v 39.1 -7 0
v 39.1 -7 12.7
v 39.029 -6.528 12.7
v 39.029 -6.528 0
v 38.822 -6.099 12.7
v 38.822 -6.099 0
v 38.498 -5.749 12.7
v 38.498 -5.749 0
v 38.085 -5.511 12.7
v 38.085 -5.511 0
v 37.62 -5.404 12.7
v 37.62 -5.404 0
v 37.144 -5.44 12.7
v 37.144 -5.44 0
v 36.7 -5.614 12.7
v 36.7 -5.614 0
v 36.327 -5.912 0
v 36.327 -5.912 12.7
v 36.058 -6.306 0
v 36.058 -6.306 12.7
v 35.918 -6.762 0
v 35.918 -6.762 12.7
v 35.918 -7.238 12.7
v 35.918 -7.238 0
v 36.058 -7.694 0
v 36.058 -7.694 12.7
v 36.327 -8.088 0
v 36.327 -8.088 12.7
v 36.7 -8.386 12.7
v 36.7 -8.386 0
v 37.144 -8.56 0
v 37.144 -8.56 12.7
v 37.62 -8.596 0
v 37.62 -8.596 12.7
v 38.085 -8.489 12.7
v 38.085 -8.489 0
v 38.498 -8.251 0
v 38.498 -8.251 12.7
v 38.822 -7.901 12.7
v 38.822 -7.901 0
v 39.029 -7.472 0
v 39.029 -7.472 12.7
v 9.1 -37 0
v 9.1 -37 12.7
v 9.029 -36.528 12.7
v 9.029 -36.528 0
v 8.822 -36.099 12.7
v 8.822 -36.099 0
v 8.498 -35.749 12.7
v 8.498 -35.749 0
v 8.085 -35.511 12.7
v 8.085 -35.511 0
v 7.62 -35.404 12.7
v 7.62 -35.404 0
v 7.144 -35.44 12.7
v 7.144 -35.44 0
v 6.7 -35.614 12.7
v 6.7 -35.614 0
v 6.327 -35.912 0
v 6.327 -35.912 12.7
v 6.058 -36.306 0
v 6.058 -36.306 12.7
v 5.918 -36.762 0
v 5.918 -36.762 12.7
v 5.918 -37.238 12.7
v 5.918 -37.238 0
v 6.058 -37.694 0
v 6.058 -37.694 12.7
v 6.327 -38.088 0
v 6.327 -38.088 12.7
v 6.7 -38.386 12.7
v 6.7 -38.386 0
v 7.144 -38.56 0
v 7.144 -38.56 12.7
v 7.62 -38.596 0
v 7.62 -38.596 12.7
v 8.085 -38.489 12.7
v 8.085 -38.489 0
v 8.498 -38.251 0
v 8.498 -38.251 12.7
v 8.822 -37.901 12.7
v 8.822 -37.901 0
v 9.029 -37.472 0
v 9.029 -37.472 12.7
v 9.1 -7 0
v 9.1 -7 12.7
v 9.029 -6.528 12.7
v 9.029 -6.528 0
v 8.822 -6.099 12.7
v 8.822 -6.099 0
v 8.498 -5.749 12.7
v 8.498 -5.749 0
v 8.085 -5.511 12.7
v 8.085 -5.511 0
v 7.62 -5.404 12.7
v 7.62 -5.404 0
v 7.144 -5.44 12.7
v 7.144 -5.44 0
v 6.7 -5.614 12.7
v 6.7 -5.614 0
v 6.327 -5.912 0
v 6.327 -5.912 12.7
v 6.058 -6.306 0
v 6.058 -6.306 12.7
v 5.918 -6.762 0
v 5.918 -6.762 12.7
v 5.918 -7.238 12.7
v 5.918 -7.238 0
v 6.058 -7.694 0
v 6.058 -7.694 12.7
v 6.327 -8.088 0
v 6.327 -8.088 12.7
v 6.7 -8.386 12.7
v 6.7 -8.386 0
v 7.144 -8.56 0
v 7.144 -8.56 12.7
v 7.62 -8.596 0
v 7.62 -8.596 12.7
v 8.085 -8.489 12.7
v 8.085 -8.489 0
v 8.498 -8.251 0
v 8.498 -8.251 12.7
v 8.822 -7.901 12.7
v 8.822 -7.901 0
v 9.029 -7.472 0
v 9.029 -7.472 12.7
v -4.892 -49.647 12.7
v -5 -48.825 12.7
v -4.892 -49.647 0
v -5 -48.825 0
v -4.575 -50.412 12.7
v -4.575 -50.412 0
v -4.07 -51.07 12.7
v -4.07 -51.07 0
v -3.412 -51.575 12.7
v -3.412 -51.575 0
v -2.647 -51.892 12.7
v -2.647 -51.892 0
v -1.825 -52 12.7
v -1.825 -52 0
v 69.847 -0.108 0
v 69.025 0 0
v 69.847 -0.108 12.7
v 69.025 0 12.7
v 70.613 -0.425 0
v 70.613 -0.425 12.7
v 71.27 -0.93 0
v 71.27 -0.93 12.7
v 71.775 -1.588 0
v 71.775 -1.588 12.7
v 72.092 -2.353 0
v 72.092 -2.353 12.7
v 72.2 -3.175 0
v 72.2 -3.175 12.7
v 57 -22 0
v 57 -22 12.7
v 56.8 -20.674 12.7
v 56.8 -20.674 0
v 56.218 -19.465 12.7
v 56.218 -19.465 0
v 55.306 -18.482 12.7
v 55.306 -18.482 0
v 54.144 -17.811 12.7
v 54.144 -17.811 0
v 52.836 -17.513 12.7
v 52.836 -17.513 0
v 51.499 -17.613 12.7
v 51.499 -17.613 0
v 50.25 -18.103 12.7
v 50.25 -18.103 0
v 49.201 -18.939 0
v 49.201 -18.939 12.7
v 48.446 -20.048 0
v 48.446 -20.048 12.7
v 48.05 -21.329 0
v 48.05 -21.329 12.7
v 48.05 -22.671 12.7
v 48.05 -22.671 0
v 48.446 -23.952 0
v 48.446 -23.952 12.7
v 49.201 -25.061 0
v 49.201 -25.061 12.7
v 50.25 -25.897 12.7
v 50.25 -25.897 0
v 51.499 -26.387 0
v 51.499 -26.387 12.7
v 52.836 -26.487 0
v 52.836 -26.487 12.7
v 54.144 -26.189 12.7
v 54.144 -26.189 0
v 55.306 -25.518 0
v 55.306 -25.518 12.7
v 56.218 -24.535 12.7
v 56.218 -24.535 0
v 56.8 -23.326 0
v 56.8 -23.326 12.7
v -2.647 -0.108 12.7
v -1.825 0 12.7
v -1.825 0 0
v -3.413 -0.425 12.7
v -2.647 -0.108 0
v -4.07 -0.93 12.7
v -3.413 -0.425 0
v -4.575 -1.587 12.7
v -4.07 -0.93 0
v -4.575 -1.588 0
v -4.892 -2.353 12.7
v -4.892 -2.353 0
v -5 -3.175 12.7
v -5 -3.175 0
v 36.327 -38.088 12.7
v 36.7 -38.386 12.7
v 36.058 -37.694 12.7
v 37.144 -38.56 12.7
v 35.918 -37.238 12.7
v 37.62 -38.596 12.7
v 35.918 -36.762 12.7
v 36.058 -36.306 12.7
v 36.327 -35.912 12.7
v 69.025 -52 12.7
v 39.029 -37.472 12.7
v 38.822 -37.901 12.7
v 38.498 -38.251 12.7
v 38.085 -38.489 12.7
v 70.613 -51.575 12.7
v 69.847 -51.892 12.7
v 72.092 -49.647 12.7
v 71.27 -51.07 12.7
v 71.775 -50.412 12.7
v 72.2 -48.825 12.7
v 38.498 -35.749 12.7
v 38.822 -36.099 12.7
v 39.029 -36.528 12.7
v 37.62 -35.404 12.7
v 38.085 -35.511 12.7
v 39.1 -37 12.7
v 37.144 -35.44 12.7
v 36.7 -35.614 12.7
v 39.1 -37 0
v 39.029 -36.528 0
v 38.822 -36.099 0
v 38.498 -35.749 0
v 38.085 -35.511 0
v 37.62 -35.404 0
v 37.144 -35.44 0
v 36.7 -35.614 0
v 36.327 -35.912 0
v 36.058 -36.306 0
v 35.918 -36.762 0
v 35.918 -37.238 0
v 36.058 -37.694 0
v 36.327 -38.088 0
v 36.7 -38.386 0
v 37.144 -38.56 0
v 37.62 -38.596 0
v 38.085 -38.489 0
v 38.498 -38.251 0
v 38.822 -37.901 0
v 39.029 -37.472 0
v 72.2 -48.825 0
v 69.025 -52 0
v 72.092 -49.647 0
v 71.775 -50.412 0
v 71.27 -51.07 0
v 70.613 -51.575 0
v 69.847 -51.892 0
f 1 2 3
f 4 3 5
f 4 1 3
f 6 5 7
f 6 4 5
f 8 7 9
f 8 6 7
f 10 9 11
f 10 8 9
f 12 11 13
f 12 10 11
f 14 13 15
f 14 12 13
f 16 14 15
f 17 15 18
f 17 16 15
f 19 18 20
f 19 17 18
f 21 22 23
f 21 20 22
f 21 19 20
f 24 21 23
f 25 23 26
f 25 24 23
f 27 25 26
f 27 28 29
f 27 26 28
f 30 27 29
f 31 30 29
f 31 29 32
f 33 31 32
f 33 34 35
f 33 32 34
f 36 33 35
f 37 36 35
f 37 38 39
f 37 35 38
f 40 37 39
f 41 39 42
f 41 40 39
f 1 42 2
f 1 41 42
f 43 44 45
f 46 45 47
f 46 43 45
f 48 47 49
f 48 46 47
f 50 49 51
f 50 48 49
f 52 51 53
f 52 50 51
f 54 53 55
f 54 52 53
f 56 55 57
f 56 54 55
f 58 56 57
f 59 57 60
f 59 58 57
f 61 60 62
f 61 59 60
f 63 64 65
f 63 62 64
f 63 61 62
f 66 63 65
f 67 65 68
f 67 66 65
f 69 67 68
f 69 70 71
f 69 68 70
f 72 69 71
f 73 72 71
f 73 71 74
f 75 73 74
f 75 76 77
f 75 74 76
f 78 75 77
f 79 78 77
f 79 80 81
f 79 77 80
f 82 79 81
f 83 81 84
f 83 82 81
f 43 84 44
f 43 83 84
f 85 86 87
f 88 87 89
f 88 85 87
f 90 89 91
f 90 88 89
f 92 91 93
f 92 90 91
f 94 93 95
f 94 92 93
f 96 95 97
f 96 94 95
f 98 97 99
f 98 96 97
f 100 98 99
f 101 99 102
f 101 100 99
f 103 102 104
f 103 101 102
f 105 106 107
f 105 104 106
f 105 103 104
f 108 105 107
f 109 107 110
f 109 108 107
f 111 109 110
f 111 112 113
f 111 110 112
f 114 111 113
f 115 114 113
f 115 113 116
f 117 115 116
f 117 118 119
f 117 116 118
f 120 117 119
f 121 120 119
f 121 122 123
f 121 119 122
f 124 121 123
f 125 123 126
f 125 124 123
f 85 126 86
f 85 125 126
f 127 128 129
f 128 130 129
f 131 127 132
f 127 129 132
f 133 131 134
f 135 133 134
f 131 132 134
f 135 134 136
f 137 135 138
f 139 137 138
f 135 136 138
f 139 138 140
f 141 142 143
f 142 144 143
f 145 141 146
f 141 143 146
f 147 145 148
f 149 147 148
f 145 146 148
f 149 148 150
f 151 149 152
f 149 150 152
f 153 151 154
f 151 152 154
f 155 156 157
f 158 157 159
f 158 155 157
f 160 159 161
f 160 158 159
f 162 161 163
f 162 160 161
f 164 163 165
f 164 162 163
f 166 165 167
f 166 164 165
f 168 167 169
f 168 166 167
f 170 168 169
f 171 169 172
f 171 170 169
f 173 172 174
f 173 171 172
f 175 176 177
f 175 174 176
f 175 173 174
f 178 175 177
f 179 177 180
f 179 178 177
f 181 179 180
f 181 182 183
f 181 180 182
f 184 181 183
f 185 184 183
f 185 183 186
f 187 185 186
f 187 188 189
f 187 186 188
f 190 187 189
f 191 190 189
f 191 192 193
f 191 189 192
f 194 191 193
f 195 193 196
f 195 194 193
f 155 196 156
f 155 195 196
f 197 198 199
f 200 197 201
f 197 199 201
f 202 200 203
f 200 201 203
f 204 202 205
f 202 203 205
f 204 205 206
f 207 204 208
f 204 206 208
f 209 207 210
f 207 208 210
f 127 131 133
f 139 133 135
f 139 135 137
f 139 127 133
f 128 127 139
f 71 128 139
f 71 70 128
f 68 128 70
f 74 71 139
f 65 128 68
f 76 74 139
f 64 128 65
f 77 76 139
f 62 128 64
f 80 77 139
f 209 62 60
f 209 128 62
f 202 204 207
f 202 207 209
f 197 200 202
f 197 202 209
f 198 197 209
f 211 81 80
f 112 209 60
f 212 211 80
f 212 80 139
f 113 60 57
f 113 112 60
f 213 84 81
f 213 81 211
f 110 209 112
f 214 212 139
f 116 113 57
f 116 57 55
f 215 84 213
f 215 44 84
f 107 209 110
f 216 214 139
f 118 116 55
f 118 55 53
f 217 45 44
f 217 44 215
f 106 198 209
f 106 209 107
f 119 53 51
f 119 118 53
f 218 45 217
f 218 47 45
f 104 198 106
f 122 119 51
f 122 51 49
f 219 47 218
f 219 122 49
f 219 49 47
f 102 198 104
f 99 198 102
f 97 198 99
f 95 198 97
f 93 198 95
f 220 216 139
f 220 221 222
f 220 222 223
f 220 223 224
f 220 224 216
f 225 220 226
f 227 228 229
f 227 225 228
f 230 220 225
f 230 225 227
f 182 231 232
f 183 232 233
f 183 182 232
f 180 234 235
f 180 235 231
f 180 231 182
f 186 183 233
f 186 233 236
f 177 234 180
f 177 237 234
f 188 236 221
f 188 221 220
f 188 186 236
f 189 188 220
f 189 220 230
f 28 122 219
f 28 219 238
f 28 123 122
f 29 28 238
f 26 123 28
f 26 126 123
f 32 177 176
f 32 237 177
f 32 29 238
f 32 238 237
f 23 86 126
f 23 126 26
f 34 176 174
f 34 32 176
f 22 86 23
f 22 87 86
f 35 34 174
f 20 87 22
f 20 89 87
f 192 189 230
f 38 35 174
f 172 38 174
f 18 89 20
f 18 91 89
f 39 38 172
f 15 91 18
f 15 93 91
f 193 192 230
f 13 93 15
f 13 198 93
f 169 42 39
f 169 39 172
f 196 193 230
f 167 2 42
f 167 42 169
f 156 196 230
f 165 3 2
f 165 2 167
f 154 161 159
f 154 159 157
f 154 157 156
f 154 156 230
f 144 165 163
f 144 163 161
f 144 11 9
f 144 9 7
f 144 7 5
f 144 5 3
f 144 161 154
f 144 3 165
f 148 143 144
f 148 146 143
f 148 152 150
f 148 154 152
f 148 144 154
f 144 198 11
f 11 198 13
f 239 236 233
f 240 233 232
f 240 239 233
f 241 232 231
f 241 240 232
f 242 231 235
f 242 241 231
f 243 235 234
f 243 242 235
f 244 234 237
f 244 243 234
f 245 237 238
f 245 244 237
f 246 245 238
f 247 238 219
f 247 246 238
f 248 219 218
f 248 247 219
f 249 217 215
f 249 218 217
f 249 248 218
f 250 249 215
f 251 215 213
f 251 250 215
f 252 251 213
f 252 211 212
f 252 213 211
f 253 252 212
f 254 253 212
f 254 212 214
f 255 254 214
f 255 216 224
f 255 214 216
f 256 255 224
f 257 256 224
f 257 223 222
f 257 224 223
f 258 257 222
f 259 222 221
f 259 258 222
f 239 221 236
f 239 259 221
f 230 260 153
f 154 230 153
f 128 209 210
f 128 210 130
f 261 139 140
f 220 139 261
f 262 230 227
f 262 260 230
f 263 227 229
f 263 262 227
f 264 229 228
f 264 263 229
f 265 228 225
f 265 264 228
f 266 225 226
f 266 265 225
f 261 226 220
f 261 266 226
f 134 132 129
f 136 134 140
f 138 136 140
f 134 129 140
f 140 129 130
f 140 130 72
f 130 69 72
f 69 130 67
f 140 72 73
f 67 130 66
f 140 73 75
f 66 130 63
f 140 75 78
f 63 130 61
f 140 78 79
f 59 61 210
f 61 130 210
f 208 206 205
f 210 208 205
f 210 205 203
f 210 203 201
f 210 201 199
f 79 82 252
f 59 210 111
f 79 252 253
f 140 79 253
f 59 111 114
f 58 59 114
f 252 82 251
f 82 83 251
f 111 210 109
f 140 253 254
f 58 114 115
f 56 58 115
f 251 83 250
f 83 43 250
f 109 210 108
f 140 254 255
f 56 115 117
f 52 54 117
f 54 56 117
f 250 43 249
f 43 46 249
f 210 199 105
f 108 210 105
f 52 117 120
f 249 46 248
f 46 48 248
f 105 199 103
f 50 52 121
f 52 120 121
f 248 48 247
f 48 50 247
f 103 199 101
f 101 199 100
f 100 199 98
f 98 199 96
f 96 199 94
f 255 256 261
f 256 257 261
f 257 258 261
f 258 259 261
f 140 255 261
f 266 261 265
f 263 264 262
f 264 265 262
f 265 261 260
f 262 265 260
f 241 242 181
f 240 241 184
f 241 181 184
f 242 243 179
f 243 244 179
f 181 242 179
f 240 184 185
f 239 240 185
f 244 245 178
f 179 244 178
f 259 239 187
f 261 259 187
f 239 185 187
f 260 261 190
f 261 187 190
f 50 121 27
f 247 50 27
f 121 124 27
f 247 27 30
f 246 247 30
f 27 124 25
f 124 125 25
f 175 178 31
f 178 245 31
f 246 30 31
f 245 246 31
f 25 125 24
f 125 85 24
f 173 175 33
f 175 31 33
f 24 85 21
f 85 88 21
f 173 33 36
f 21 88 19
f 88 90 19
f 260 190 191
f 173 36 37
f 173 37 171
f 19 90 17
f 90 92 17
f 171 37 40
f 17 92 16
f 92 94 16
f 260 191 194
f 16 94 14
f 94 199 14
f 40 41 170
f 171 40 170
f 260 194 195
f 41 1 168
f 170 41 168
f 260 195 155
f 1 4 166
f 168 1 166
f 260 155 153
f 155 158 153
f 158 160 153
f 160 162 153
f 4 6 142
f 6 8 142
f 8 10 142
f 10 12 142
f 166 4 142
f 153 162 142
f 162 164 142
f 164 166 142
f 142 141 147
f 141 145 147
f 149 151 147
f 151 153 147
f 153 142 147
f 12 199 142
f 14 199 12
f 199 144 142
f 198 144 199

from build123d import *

# Parameters (mm, degrees)
SKETCH1_W           = 72.2
SKETCH1_H           = 44
BOSS_EXTRUDE1_DEPTH = 12.7
BOSS_EXTRUDE2_DEPTH = 12.7
SKETCH1_5_R         = 4.5
SKETCH1_5_R_2       = 1.6
CUT_EXTRUDE3_DEPTH  = 90.878417877
FILLET1_R           = 3.175


with BuildPart() as part:
    # Sketch1 → Boss-Extrude1 (new body)
    with BuildSketch(Plane.XY):
        with Locations((36.1, -22)):
            Rectangle(SKETCH1_W, SKETCH1_H)
    extrude(amount=BOSS_EXTRUDE1_DEPTH)

    # Sketch2 → Boss-Extrude2 (add)
    with BuildSketch(Plane.XY.offset(12.7)):
        Polygon((72.2, -44), (0, -44), (0, 0), (-5, 0), (-5, -52), (72.2, -52), align=None)
    extrude(amount=-BOSS_EXTRUDE2_DEPTH)

    # Sketch1<5> → Cut-Extrude3 (cut, through all)
    with BuildSketch(Plane.XY):
        with Locations((52.5, -22)):
            Circle(SKETCH1_5_R)
        with Locations((7.5, -37)):
            Circle(SKETCH1_5_R_2)
        with Locations((7.5, -7)):
            Circle(SKETCH1_5_R_2)
        with Locations((37.5, -7)):
            Circle(SKETCH1_5_R_2)
        with Locations((37.5, -37)):
            Circle(SKETCH1_5_R_2)
    extrude(amount=CUT_EXTRUDE3_DEPTH, mode=Mode.SUBTRACT)

    # Fillet1
    fillet1_edges = [part.edges().sort_by_distance(p)[0] for p in [
        (72.2, 0, 6.35),
        (-5, 0, 6.35),
        (72.2, -52, 6.35),
        (-5, -52, 6.35),
    ]]
    fillet(fillet1_edges, radius=FILLET1_R)


solid = part.part
